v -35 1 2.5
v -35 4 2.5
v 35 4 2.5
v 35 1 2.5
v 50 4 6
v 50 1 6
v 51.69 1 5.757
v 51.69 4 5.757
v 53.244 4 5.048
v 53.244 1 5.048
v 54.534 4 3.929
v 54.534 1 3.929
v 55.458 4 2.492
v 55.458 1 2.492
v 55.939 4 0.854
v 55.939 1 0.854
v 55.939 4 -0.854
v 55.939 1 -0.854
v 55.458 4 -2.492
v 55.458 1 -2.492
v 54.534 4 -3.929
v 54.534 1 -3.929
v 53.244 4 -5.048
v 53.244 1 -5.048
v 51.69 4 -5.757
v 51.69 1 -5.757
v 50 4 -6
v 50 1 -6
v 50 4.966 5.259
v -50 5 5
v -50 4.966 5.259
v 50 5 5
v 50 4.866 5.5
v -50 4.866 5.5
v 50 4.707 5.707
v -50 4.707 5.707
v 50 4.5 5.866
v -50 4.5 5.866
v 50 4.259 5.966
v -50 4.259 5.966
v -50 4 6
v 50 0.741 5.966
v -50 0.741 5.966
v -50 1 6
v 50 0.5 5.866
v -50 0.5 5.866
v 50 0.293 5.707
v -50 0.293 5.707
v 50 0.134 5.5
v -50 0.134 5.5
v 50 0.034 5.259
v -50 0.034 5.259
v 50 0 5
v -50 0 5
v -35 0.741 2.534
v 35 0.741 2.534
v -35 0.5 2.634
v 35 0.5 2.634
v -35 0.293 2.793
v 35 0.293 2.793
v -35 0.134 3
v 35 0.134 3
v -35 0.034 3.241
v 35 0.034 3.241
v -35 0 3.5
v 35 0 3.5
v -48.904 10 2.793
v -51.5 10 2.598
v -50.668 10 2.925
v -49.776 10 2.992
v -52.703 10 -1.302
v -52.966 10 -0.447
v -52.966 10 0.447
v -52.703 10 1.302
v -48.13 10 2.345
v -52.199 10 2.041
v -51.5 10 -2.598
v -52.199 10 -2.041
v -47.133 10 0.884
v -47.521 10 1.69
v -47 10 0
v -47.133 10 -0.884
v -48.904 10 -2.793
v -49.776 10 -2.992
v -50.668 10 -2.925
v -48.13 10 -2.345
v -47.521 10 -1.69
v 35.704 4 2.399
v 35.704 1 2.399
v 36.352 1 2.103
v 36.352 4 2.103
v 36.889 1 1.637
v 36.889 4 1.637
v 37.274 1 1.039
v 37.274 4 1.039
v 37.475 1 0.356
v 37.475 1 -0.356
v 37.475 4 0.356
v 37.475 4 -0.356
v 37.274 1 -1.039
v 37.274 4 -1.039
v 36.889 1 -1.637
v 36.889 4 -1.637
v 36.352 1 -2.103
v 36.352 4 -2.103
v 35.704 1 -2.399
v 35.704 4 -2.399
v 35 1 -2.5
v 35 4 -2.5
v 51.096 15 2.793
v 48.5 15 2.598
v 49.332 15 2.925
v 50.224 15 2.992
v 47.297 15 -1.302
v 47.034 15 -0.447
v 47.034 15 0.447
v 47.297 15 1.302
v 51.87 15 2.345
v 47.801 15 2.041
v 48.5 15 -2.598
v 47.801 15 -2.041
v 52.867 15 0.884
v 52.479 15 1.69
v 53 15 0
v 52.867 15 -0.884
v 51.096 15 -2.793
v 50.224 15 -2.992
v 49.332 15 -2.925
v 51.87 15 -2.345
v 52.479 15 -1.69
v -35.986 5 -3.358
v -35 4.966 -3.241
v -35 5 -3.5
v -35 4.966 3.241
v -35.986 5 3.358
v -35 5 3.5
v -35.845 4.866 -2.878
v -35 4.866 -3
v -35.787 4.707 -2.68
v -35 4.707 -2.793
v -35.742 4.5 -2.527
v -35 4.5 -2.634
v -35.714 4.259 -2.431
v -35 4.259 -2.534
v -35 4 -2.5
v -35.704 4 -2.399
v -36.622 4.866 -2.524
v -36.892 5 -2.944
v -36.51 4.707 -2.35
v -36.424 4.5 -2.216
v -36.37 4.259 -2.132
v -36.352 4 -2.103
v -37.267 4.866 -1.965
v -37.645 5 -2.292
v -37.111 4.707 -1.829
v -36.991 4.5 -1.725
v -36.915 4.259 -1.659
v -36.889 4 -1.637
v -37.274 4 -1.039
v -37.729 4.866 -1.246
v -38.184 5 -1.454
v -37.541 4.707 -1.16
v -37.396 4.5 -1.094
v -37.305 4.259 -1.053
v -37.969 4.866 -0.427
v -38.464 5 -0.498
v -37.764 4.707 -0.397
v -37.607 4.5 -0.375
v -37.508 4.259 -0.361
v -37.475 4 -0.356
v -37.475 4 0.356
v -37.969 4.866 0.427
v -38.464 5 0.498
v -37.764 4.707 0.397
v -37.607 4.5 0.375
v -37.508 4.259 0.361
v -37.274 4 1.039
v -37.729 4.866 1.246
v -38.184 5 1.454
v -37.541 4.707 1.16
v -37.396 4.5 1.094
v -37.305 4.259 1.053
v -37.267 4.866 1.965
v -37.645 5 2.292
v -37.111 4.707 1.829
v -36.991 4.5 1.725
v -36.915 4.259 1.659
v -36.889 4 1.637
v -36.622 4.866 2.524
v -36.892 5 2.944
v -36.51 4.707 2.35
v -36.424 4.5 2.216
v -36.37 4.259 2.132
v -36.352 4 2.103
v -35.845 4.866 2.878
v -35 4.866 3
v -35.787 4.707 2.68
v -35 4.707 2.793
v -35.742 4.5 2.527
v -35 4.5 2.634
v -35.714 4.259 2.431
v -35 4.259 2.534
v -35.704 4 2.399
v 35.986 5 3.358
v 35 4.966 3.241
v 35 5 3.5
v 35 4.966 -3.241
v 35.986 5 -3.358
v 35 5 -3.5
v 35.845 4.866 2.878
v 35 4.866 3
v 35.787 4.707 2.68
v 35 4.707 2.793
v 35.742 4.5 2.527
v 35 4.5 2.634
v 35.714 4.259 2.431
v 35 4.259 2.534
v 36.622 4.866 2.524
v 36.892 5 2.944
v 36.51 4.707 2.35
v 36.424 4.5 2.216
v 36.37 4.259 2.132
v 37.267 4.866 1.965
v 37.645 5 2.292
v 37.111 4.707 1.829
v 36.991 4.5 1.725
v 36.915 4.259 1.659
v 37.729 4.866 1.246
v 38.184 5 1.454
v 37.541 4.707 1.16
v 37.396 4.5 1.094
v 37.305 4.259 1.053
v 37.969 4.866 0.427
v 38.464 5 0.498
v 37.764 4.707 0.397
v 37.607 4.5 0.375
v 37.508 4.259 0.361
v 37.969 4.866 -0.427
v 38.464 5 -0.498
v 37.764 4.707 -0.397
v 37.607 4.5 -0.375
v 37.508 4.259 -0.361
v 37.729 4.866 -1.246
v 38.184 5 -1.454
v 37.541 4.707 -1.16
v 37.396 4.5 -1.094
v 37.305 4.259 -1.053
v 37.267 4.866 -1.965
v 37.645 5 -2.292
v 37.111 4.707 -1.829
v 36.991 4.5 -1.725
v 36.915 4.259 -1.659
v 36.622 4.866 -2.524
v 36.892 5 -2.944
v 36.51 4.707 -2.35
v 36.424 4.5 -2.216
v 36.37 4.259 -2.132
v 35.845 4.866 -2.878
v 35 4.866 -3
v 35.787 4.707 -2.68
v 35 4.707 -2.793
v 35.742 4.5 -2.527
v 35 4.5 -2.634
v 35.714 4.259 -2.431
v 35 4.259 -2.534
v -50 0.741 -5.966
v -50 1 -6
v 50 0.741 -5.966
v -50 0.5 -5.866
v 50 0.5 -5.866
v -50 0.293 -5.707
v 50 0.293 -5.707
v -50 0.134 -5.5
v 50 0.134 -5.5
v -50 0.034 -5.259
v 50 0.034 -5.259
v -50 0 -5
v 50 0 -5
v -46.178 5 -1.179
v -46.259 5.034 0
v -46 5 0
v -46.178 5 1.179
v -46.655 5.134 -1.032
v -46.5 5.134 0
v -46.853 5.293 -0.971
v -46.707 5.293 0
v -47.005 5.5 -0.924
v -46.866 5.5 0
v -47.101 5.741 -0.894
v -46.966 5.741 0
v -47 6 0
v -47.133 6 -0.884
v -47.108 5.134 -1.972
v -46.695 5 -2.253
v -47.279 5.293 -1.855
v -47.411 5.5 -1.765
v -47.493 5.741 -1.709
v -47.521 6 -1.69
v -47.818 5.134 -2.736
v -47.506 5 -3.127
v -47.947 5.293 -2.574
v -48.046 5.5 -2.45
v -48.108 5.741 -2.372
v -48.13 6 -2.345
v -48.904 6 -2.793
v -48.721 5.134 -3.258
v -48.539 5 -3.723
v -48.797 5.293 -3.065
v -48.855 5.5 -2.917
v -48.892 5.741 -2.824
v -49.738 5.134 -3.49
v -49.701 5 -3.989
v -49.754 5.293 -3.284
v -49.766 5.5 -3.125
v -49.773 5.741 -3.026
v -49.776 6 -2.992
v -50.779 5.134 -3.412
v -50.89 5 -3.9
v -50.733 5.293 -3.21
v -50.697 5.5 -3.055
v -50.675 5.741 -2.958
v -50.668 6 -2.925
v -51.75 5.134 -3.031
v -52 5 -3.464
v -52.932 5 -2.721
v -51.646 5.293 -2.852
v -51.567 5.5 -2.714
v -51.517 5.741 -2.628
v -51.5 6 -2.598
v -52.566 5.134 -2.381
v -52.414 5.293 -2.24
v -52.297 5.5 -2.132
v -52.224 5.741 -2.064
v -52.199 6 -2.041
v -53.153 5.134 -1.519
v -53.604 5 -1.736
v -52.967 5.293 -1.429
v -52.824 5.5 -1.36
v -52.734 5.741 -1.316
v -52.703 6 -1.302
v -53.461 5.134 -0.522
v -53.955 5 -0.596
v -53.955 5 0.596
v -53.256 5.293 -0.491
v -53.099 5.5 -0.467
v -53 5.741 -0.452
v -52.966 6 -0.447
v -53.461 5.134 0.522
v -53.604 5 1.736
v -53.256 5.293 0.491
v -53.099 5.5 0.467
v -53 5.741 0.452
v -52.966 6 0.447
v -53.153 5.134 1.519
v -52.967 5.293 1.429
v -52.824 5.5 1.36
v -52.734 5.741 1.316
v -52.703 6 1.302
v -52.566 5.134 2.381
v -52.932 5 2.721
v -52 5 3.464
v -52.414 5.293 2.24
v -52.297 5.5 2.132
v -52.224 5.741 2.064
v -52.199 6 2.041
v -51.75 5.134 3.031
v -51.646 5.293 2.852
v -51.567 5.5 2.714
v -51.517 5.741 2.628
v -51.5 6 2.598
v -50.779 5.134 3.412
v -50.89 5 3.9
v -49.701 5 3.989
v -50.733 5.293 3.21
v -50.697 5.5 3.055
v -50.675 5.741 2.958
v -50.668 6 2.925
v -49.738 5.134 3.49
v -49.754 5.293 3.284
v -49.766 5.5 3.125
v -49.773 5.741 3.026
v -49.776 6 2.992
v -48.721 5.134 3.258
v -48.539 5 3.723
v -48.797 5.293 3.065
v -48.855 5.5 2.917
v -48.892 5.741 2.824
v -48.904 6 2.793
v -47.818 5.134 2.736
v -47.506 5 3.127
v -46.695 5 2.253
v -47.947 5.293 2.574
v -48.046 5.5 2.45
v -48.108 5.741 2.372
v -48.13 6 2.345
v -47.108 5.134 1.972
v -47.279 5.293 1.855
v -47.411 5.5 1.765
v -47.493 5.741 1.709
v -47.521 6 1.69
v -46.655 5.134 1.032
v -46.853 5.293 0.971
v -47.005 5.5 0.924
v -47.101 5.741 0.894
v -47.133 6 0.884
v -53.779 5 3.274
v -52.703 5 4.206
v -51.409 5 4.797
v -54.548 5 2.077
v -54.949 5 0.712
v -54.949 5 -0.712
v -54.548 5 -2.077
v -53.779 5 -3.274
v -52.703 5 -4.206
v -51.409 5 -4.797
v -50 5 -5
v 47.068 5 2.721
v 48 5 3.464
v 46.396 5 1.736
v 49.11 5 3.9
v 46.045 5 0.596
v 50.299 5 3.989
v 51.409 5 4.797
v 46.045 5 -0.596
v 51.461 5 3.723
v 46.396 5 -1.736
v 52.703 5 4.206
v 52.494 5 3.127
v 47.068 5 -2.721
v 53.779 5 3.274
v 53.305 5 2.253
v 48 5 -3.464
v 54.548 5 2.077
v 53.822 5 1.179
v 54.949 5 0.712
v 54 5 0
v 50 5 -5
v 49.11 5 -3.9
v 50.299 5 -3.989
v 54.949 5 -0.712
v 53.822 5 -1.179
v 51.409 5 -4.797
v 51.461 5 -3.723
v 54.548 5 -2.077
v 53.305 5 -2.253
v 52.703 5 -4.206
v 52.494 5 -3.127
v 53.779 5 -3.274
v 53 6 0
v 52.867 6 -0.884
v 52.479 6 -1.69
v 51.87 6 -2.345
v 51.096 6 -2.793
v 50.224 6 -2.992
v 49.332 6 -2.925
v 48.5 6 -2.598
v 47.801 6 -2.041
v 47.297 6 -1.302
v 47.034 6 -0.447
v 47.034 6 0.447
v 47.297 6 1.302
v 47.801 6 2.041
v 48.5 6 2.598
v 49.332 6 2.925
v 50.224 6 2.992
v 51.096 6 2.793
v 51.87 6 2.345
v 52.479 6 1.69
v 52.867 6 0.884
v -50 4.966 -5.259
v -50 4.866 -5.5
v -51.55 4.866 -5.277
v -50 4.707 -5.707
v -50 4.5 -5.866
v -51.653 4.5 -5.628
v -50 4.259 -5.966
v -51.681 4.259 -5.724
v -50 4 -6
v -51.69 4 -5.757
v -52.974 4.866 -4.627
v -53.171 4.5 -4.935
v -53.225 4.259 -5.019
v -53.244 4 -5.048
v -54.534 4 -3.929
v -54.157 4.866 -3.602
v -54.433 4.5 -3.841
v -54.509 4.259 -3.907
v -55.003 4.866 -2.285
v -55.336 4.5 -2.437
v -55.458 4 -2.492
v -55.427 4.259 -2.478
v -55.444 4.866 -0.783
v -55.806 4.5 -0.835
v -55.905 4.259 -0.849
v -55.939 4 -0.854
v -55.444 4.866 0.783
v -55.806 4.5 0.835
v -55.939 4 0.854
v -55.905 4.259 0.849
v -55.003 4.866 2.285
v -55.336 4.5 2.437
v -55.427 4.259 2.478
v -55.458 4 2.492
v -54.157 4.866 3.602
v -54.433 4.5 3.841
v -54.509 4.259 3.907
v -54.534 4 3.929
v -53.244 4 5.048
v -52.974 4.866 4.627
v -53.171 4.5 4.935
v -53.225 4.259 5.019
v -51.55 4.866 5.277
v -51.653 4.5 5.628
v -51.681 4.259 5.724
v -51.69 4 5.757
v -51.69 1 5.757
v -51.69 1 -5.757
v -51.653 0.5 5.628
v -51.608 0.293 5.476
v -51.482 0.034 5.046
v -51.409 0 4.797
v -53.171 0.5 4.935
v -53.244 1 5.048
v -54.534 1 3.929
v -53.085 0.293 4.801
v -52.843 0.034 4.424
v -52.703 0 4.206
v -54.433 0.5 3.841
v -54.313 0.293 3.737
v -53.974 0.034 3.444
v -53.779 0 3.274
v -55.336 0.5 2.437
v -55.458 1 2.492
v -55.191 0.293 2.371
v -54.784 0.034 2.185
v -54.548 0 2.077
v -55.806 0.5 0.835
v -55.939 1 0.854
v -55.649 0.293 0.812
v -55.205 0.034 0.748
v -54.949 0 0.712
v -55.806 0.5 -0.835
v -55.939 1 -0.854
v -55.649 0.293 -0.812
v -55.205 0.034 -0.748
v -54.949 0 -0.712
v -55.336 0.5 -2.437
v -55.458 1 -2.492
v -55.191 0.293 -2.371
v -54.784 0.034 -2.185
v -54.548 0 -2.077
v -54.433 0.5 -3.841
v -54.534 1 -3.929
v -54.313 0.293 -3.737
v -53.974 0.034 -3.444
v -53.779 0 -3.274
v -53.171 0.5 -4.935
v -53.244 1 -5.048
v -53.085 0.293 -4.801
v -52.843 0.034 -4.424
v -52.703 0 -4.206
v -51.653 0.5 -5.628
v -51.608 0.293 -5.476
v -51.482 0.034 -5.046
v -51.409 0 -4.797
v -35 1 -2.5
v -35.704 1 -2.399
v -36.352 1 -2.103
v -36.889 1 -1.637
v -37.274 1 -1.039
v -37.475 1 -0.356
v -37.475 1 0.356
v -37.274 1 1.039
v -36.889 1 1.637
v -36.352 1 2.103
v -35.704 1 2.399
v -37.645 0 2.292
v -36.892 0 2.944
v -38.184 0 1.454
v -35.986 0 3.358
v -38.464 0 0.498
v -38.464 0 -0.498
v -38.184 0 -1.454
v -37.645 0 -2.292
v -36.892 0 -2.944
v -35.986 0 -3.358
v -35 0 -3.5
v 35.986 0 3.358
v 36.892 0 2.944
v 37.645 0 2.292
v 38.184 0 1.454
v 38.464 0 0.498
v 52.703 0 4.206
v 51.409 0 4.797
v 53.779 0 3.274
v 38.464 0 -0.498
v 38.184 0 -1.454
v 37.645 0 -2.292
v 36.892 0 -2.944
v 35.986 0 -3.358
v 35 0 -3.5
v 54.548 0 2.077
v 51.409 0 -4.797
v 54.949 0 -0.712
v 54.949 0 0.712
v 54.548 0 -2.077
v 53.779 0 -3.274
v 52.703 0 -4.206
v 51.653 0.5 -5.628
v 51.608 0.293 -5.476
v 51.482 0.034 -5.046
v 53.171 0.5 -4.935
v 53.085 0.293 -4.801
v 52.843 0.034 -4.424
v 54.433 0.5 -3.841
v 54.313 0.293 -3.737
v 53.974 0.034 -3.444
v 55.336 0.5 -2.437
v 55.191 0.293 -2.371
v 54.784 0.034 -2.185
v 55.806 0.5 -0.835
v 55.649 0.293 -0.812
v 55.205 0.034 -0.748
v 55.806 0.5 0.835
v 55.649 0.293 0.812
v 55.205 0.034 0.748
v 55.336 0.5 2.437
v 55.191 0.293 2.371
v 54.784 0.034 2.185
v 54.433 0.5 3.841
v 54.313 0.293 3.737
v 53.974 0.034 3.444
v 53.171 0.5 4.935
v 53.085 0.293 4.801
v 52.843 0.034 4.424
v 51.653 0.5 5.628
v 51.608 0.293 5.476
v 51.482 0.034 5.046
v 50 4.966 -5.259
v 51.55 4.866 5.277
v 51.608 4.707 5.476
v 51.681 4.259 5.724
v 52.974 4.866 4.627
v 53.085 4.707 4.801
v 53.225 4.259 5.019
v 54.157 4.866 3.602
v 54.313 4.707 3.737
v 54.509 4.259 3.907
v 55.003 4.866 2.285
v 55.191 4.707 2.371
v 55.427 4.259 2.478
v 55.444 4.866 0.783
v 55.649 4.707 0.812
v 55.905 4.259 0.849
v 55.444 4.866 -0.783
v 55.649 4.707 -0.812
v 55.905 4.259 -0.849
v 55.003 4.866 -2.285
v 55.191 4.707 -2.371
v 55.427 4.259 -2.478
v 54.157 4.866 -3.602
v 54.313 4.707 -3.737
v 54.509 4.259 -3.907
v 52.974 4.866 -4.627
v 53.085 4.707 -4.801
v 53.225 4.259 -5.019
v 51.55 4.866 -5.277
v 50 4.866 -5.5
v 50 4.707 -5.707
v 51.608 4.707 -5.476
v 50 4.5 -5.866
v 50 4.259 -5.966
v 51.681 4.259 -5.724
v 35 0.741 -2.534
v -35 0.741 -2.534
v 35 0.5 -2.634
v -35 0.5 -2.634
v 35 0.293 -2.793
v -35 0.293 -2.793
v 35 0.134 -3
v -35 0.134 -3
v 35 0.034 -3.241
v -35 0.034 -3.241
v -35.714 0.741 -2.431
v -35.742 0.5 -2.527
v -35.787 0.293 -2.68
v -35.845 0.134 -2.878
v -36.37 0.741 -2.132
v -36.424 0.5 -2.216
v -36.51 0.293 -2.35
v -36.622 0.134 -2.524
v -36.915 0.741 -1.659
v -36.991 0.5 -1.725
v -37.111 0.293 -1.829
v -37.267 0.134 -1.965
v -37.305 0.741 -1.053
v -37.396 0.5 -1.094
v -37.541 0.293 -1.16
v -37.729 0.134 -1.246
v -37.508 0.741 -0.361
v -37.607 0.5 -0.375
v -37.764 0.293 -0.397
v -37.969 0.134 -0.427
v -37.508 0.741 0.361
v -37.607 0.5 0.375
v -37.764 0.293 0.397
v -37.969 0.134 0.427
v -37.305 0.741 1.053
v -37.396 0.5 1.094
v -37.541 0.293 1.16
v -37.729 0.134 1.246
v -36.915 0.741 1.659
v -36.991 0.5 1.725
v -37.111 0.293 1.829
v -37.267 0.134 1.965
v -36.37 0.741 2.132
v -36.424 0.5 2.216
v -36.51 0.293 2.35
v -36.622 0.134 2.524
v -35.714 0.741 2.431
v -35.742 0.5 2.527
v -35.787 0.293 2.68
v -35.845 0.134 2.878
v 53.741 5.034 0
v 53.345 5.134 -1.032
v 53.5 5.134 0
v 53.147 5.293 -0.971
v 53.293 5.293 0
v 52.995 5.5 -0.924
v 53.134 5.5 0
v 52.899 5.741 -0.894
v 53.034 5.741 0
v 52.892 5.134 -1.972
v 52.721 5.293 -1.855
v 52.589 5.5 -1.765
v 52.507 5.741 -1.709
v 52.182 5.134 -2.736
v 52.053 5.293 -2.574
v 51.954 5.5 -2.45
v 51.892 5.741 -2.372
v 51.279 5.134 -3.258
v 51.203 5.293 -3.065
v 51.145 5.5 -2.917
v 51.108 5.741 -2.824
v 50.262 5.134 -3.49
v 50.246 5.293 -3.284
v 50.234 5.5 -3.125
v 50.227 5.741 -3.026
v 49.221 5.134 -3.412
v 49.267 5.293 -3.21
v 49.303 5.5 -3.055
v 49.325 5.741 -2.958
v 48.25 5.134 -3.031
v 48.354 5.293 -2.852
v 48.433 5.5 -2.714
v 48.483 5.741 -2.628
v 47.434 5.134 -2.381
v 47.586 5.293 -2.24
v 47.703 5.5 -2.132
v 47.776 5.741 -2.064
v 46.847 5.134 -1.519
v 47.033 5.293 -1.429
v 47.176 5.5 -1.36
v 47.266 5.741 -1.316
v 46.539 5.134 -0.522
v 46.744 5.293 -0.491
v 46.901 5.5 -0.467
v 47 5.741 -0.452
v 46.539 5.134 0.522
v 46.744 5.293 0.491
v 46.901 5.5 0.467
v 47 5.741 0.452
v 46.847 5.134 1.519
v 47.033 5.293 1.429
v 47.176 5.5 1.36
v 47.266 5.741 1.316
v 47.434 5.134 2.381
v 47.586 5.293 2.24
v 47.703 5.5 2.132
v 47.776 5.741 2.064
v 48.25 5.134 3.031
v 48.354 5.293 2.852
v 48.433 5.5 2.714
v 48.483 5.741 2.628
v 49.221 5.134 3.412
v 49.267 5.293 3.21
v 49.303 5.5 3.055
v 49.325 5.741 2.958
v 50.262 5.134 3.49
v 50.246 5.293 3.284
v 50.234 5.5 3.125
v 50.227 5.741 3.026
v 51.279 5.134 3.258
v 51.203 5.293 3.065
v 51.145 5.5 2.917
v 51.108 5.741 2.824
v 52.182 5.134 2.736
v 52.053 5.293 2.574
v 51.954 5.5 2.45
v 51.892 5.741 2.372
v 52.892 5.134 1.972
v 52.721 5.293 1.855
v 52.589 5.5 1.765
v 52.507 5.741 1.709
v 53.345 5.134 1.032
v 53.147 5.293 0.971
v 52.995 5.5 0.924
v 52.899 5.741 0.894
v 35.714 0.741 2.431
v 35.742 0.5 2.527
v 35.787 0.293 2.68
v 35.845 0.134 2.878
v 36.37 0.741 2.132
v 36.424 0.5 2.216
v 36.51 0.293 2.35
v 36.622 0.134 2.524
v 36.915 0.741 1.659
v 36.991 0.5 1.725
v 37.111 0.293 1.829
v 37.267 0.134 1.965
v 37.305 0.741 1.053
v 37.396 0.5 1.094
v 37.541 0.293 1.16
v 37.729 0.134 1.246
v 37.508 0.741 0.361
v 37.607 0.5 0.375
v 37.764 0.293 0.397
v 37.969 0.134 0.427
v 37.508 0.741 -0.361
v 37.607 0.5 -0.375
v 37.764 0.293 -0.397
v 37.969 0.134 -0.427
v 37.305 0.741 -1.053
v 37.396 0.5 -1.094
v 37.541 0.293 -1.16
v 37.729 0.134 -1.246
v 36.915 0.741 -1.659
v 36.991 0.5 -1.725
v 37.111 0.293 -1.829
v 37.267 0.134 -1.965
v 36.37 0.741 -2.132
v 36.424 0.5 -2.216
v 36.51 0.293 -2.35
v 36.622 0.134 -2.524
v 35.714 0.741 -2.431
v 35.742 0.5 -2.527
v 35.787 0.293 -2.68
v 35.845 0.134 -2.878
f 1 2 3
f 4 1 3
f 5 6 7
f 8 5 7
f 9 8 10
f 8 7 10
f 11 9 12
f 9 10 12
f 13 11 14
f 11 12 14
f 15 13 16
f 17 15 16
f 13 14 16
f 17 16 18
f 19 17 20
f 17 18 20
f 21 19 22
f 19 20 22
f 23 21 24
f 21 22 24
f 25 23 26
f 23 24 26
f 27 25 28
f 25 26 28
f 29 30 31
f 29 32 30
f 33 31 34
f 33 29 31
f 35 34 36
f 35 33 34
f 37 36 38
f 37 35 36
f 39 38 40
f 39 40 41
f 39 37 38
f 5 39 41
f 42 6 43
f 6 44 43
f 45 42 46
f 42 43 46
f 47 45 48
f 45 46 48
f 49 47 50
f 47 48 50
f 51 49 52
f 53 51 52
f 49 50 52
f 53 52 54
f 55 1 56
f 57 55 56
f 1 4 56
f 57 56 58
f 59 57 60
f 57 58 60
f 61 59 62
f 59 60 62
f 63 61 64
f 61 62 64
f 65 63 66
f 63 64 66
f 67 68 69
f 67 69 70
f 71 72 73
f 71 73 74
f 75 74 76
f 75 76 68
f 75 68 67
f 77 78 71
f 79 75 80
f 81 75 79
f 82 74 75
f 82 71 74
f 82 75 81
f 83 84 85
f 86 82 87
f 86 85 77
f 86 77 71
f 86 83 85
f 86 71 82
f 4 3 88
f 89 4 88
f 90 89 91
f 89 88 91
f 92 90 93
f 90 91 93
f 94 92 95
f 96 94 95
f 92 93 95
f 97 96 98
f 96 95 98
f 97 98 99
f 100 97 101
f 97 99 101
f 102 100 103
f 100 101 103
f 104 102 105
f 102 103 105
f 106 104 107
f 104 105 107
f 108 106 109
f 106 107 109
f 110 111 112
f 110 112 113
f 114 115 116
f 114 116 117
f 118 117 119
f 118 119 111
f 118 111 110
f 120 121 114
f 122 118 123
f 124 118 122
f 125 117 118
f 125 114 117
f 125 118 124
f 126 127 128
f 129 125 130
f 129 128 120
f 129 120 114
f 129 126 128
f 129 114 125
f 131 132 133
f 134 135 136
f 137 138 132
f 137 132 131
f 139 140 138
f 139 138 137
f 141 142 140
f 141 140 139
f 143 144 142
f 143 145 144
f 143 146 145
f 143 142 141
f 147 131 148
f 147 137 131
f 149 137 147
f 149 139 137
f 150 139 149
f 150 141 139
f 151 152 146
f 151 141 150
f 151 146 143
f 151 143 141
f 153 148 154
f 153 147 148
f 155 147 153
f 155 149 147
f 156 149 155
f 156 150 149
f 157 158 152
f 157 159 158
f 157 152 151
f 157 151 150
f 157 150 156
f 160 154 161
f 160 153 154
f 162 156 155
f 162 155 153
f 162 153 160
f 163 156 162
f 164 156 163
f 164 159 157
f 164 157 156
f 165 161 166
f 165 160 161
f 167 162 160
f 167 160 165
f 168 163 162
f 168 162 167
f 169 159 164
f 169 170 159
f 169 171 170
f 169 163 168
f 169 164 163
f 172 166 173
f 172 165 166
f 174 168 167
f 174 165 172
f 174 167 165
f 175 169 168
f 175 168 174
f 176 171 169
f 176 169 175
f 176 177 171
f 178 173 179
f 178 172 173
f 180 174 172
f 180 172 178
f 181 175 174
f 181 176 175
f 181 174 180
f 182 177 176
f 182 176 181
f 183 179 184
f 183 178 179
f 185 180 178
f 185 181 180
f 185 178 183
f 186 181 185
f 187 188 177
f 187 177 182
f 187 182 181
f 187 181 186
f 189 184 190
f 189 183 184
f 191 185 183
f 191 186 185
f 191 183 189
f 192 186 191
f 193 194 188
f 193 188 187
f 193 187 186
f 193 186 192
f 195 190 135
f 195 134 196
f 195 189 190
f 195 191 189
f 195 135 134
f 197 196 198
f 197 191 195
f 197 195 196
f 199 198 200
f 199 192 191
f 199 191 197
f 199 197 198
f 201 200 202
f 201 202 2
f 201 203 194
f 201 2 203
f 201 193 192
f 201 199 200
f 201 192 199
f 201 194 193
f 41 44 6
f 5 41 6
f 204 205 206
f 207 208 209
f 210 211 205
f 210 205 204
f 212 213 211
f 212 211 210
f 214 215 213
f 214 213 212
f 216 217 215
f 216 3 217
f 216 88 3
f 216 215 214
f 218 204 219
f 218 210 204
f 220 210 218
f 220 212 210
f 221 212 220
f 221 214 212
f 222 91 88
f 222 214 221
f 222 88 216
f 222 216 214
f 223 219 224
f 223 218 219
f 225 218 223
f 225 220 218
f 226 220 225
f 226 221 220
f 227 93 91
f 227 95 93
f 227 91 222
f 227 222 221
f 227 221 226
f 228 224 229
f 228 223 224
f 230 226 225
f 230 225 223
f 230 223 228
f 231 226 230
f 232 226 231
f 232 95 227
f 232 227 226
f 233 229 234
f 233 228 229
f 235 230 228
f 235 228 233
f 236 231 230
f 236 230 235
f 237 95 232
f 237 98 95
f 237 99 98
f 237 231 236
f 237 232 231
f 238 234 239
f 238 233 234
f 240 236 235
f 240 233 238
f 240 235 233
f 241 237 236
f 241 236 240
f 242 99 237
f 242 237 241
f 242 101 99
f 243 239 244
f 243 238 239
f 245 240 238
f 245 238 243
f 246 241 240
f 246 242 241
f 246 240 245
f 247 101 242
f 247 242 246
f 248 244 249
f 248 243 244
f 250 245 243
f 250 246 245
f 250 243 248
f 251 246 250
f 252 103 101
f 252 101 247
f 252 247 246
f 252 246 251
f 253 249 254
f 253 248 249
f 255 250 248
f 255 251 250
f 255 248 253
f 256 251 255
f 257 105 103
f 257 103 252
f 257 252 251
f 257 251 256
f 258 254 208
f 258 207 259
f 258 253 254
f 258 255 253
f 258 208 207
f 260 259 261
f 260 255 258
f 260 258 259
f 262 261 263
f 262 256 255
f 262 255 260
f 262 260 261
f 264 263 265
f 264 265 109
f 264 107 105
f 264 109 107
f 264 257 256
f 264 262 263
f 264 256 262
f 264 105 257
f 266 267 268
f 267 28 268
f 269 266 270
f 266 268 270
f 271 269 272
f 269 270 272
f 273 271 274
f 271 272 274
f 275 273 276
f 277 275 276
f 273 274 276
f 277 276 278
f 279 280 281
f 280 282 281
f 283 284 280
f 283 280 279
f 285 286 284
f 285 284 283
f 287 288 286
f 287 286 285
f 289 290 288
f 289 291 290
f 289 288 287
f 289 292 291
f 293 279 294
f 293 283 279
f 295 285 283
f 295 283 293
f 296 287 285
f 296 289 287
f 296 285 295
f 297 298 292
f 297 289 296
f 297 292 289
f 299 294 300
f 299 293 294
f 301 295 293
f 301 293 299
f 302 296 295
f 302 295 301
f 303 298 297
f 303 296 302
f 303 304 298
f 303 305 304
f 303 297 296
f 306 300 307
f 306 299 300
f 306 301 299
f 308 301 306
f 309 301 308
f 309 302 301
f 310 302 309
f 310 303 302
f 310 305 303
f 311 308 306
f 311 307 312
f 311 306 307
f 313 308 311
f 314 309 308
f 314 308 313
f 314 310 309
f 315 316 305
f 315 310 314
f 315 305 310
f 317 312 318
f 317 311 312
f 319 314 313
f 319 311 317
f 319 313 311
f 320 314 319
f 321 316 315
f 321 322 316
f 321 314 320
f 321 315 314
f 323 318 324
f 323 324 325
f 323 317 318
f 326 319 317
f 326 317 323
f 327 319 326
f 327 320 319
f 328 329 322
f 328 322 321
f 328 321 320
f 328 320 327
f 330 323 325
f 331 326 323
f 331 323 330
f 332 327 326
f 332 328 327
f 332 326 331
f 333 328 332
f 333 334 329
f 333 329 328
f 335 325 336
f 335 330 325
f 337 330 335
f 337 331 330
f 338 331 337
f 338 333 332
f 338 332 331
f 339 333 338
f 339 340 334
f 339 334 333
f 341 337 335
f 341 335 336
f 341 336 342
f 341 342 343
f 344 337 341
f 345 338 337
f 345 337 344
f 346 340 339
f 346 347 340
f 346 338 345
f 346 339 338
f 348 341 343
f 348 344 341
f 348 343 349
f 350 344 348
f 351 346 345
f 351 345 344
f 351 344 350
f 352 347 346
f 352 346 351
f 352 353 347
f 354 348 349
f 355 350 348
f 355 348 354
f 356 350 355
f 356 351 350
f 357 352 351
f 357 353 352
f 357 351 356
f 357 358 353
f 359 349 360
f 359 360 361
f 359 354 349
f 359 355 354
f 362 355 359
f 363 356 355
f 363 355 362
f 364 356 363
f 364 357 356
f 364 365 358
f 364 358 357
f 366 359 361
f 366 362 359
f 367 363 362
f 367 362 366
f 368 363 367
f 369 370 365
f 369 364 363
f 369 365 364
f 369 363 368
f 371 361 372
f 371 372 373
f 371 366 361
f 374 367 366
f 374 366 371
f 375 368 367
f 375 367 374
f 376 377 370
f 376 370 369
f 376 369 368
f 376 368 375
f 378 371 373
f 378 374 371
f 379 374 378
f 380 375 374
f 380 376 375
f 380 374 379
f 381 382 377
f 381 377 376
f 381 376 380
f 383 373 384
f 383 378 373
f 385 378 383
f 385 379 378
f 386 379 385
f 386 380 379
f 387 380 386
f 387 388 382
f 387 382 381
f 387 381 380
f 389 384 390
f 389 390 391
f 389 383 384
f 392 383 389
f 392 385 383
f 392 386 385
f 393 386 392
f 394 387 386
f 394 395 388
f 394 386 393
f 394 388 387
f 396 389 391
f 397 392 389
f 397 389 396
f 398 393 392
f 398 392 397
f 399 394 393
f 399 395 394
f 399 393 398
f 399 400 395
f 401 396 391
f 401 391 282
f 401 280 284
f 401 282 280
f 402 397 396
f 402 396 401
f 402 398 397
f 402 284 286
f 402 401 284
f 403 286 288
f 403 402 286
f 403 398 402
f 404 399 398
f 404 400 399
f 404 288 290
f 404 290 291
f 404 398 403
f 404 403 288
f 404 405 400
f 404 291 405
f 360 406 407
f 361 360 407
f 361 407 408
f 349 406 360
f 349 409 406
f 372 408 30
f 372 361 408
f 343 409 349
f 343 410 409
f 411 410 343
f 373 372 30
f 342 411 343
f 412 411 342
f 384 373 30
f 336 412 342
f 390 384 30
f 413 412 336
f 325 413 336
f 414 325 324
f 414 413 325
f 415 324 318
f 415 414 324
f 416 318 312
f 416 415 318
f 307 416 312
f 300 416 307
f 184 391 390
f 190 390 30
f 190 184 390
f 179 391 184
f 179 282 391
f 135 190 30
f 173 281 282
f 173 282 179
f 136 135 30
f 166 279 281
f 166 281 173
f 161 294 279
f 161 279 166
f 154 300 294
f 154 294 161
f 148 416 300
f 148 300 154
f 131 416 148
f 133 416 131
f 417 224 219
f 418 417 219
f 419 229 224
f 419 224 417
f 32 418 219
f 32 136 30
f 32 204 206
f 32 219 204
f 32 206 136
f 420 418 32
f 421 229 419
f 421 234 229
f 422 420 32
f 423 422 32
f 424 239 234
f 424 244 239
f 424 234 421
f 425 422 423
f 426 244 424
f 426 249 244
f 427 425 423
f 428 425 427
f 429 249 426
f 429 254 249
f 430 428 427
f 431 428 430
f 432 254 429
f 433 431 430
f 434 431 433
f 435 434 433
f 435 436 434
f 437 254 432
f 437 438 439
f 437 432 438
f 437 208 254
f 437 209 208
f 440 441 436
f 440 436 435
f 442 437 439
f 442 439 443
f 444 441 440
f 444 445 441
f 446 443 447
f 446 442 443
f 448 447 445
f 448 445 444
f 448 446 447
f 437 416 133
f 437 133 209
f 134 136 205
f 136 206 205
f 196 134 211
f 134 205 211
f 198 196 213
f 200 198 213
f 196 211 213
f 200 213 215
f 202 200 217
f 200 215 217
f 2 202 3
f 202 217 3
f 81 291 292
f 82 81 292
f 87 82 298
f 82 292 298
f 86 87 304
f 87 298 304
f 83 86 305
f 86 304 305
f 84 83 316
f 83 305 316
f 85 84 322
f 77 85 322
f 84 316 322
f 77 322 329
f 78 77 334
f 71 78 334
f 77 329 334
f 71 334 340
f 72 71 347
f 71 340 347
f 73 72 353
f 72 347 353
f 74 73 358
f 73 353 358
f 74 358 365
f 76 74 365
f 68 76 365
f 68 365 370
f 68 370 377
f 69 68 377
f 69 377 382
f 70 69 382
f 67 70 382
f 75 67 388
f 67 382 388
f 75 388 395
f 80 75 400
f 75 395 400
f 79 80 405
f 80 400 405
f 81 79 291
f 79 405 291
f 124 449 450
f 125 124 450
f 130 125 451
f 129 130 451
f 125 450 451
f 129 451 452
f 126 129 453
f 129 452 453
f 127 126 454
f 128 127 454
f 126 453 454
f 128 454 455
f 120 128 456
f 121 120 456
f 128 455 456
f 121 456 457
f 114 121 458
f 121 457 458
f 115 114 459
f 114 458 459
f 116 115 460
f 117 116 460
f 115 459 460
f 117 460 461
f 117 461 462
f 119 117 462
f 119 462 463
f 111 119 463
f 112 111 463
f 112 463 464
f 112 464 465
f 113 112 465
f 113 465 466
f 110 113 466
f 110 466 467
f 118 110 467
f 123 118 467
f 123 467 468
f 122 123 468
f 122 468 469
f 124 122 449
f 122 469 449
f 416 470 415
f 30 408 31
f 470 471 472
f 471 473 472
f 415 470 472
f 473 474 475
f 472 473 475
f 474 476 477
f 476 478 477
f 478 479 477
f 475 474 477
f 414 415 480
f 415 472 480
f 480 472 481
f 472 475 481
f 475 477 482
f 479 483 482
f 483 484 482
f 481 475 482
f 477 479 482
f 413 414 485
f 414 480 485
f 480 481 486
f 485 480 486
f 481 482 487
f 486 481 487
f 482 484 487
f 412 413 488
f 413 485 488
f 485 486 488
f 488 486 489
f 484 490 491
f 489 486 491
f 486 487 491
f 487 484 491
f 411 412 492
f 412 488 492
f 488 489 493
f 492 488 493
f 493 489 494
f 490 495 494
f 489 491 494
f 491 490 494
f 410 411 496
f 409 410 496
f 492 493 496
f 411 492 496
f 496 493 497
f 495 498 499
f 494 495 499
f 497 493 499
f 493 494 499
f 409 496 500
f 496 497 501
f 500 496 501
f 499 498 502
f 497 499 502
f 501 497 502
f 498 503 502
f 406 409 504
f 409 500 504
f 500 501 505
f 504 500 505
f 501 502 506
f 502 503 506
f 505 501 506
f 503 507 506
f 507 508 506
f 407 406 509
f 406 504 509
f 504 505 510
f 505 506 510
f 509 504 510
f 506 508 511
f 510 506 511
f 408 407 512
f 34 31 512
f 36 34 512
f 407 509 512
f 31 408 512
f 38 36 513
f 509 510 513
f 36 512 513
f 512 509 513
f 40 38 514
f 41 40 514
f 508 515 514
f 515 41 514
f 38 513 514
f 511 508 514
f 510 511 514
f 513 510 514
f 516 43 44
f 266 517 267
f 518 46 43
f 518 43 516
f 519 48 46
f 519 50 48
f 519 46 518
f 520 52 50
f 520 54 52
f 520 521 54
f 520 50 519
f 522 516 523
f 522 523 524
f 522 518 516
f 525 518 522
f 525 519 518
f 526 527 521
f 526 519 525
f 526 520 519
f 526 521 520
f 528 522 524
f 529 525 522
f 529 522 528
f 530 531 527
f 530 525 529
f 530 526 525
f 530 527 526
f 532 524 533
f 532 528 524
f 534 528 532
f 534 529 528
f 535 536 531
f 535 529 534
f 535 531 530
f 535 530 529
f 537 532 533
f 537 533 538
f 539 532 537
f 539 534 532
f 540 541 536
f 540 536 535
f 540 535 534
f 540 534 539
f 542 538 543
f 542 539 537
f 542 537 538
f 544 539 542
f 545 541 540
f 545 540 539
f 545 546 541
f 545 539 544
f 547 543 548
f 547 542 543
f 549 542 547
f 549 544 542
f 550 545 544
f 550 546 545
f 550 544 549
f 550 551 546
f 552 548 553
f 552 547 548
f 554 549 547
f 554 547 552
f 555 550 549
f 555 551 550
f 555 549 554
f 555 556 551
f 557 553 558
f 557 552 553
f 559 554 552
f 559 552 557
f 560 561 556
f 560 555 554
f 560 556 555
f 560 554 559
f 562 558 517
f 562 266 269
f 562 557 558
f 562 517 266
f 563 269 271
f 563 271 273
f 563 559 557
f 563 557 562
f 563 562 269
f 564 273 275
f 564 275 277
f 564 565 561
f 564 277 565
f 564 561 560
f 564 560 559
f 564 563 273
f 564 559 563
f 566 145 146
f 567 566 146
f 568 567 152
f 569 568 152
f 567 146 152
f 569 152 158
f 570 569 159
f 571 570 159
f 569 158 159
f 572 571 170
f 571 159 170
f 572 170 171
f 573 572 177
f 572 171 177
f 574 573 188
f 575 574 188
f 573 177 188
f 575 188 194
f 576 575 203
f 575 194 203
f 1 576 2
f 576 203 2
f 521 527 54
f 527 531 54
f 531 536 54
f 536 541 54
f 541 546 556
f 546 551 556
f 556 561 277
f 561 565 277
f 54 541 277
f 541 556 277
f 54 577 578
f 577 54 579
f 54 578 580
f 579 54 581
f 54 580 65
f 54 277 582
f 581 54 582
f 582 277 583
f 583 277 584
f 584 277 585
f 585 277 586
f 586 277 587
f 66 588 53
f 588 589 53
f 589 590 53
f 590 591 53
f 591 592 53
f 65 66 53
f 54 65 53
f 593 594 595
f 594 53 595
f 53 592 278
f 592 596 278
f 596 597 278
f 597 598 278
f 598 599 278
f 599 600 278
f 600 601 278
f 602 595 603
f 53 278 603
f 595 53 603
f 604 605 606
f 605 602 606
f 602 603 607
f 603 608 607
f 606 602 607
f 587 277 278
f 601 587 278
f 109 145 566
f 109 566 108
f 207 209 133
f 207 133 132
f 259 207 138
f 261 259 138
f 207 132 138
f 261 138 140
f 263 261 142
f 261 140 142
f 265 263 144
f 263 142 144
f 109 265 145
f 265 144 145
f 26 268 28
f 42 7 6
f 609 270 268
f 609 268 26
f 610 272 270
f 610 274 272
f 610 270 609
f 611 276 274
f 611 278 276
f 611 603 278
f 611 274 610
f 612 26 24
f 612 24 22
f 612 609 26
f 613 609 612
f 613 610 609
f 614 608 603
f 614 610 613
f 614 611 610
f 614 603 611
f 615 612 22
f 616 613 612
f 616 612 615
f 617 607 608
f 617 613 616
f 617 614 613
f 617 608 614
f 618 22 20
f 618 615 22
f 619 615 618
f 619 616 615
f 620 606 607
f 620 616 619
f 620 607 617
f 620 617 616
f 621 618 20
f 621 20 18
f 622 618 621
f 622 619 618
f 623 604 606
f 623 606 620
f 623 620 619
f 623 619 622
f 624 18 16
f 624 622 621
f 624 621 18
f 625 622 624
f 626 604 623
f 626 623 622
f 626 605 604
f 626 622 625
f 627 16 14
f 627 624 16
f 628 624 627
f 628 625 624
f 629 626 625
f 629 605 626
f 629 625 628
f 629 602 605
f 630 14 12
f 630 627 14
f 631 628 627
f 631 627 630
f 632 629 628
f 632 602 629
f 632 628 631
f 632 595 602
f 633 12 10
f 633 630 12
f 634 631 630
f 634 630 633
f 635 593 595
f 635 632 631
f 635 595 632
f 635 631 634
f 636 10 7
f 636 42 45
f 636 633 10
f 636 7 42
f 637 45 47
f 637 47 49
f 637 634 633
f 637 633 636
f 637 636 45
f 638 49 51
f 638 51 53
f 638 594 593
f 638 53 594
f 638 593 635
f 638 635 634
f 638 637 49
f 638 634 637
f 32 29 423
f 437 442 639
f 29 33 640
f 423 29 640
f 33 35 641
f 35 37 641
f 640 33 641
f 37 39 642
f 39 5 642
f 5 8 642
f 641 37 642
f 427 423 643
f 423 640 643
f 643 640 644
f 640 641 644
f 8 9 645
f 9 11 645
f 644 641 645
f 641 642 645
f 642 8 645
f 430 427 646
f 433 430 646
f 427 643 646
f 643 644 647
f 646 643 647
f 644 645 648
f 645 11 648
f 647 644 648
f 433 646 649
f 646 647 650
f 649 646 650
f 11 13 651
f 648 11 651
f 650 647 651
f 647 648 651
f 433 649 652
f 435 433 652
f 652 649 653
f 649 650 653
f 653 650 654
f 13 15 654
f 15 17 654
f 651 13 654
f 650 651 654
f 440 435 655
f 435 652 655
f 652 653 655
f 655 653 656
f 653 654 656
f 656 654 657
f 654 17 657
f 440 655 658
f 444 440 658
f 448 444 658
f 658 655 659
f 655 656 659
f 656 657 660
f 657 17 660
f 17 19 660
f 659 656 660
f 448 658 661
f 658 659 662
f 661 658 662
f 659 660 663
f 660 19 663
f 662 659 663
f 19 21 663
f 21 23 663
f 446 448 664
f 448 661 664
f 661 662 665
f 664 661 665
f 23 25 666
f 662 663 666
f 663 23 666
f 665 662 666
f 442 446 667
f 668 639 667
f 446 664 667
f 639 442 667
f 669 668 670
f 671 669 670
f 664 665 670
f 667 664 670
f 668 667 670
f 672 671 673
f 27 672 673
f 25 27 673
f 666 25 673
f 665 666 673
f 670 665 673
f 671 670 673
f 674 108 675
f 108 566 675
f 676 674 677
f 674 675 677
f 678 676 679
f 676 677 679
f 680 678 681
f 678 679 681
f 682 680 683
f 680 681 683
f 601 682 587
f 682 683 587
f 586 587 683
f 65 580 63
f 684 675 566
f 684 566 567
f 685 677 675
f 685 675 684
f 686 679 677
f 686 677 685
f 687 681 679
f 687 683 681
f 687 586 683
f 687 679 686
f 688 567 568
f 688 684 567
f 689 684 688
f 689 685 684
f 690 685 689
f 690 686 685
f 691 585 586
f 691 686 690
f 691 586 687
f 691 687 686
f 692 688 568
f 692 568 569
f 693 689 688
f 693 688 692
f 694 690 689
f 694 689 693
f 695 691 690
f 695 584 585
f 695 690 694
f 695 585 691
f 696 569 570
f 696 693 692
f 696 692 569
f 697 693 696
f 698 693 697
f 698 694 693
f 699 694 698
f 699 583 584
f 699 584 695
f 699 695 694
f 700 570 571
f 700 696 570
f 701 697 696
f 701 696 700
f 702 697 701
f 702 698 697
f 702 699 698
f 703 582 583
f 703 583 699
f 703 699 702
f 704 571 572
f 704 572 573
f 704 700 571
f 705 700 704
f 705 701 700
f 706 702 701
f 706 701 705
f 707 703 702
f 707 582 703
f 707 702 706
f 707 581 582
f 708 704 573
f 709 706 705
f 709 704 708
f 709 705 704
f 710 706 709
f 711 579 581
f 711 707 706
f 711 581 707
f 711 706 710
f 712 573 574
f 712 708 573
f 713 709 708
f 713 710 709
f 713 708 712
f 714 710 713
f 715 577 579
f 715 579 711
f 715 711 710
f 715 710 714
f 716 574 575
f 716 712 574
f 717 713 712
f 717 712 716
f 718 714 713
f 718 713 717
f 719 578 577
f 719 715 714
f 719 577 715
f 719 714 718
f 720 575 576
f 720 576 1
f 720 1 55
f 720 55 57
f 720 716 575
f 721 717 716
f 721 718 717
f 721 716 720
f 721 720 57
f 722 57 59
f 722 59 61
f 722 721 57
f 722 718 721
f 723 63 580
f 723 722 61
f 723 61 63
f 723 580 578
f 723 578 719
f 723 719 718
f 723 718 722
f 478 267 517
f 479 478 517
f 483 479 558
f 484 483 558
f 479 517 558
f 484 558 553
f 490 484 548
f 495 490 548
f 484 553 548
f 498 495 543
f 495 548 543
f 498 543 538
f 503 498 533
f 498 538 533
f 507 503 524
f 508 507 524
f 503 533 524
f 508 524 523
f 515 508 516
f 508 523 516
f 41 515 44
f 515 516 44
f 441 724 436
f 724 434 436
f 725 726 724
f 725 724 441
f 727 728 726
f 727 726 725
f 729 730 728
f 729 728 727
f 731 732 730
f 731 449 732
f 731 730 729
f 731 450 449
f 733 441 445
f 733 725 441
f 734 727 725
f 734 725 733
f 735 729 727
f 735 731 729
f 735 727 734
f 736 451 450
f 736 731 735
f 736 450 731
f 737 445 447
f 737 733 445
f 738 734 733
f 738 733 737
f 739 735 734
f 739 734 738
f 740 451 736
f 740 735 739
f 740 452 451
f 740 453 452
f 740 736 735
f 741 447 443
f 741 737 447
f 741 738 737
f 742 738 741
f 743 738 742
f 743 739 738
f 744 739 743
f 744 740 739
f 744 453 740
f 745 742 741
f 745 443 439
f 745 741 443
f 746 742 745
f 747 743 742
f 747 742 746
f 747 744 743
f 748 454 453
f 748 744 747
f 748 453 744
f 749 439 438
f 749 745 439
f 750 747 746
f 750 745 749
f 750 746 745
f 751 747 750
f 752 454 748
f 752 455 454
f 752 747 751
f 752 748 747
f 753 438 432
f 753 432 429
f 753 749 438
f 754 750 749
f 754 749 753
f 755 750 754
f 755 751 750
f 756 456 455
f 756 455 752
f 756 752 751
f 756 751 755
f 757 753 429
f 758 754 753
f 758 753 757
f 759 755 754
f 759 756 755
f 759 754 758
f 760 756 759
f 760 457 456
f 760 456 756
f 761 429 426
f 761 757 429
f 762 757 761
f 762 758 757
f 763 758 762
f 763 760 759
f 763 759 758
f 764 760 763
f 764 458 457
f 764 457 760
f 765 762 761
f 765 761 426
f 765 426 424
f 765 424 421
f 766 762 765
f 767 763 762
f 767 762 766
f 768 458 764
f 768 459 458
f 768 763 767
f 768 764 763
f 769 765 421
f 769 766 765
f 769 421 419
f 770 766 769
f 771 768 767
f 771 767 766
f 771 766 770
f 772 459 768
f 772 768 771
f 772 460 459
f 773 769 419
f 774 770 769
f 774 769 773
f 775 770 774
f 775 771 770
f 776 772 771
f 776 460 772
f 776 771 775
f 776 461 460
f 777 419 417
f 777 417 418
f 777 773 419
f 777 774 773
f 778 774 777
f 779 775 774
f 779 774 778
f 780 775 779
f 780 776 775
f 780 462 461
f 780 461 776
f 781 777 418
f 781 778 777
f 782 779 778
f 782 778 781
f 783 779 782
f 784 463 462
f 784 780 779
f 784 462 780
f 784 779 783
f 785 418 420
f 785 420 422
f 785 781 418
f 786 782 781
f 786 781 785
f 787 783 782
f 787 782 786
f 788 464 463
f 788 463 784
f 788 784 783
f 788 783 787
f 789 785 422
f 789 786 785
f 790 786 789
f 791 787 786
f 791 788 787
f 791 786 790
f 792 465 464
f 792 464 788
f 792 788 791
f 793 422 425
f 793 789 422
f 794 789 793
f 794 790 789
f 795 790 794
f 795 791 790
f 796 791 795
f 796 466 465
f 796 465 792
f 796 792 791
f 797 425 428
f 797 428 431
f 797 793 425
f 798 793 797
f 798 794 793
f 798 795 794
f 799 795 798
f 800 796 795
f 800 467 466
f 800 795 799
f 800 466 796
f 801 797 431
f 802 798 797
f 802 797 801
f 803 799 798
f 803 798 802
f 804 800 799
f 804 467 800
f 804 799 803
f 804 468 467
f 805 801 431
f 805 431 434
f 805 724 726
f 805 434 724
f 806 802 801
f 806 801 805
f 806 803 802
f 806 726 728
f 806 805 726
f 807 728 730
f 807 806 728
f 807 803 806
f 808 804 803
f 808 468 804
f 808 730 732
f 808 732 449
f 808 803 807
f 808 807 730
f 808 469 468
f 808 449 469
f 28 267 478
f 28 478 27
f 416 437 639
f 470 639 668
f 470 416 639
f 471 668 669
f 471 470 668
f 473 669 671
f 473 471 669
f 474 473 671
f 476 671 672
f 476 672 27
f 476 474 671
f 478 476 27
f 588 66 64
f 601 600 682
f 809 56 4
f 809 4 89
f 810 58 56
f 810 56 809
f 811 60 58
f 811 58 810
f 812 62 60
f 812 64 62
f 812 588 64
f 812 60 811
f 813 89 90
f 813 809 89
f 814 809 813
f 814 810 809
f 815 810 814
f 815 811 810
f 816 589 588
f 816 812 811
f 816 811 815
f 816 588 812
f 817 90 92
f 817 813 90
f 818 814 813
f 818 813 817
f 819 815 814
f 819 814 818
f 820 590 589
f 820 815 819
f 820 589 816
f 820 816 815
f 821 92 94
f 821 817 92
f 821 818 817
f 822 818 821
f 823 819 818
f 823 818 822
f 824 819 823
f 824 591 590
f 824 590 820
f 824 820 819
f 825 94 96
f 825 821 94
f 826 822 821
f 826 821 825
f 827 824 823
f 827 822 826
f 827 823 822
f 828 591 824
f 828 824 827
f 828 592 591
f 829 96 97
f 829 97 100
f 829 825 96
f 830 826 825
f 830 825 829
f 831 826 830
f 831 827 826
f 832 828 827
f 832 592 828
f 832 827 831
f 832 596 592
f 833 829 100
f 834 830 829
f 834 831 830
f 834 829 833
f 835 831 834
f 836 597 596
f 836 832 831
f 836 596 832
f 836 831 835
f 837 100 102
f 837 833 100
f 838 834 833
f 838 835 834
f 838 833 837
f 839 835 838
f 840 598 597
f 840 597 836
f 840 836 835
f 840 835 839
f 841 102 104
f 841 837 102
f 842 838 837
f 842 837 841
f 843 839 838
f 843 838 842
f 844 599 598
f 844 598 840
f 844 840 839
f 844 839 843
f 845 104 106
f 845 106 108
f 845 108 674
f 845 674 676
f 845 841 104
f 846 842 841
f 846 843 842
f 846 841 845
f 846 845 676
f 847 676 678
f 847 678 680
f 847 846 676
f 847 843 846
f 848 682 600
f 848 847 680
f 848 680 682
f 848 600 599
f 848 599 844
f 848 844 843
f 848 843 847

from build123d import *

# Parameters (mm, degrees)
SKETCH_1_R          = 6
EXTRUDE_1_DEPTH     = 5
EXTRUDE_1_2_DEPTH   = 5
SKETCH_3_W          = 100
SKETCH_3_H          = 12
EXTRUDE_3_DEPTH     = 5
SKETCH_6_R          = 2.5
CUT_EXTRUDE_3_DEPTH = 6
SKETCH_7_W          = 70
SKETCH_7_H          = 5
CUT_EXTRUDE_4_DEPTH = 6
SKETCH_4_R          = 3
EXTRUDE_4_DEPTH     = 5
SKETCH_5_R          = 3
EXTRUDE_5_DEPTH     = 10
FILLET_1_R          = 1
FILLET_2_R          = 1


with BuildPart() as part:
    # 草图1 → 凸台-拉伸1 (new body)
    with BuildSketch(Plane(origin=(0, 0, 0), x_dir=(1, 0, 0), z_dir=(0, 1, 0))):
        with Locations((-50, 0)):
            Circle(SKETCH_1_R)
    extrude(amount=EXTRUDE_1_DEPTH)



with BuildPart() as body_2:
    # 草图1 → Extrude 1 2 (new body)
    with BuildSketch(Plane(origin=(0, 0, 0), x_dir=(1, 0, 0), z_dir=(0, 1, 0))):
        with Locations((50, 0)):
            Circle(SKETCH_1_R)
    extrude(amount=EXTRUDE_1_2_DEPTH)


with BuildPart() as part_1:
    add(part.part)

    add(body_2.part)  # 凸台-拉伸3 merges body 2
    # 草图3 → 凸台-拉伸3 (add)
    with BuildSketch(Plane(origin=(0, 0, 0), x_dir=(1, 0, 0), z_dir=(0, 1, 0))):
        Rectangle(SKETCH_3_W, SKETCH_3_H)
    extrude(amount=EXTRUDE_3_DEPTH)

    # 草图6 → 切除-拉伸3 (cut, through all)
    with BuildSketch(Plane(origin=(0, 5, 0), x_dir=(1, 0, 0), z_dir=(0, 1, 0))):
        with Locations((-35, 0)):
            Circle(SKETCH_6_R)
        with Locations((35, 0)):
            Circle(SKETCH_6_R)
    extrude(amount=-CUT_EXTRUDE_3_DEPTH, mode=Mode.SUBTRACT)

    # 草图7 → 切除-拉伸4 (cut, through all)
    with BuildSketch(Plane(origin=(0, 5, 0), x_dir=(1, 0, 0), z_dir=(0, 1, 0))):
        Rectangle(SKETCH_7_W, SKETCH_7_H)
    extrude(amount=-CUT_EXTRUDE_4_DEPTH, mode=Mode.SUBTRACT)

    # 草图4 → 凸台-拉伸4 (add)
    with BuildSketch(Plane(origin=(0, 5, 0), x_dir=(1, 0, 0), z_dir=(0, 1, 0))):
        with Locations((-50, 0)):
            Circle(SKETCH_4_R)
    extrude(amount=EXTRUDE_4_DEPTH)

    # 草图5 → 凸台-拉伸5 (add)
    with BuildSketch(Plane(origin=(0, 5, 0), x_dir=(1, 0, 0), z_dir=(0, 1, 0))):
        with Locations((50, 0)):
            Circle(SKETCH_5_R)
    extrude(amount=EXTRUDE_5_DEPTH)

    # 圆角1
    fillet_1_edges = [part_1.edges().sort_by_distance(p)[0] for p in [
        (-53, 5, 0),
        (47, 5, 0),
    ]]
    fillet(fillet_1_edges, radius=FILLET_1_R)

    # 圆角2
    fillet_2_edges = [part_1.edges().sort_by_distance(p)[0] for p in [
        (0, 5, 6),
        (56, 0, 0),
        (56, 5, 0),
        (37.5, 0, 0),
        (37.5, 5, 0),
        (-37.5, 0, 0),
        (-37.5, 5, 0),
        (0, 5, -2.5),
        (0, 5, 2.5),
        (0, 0, -2.5),
        (0, 0, 2.5),
        (-56, 0, 0),
        (-56, 5, 0),
        (0, 0, 6),
        (0, 0, -6),
        (0, 5, -6),
    ]]
    fillet(fillet_2_edges, radius=FILLET_2_R)


solid = part_1.part
